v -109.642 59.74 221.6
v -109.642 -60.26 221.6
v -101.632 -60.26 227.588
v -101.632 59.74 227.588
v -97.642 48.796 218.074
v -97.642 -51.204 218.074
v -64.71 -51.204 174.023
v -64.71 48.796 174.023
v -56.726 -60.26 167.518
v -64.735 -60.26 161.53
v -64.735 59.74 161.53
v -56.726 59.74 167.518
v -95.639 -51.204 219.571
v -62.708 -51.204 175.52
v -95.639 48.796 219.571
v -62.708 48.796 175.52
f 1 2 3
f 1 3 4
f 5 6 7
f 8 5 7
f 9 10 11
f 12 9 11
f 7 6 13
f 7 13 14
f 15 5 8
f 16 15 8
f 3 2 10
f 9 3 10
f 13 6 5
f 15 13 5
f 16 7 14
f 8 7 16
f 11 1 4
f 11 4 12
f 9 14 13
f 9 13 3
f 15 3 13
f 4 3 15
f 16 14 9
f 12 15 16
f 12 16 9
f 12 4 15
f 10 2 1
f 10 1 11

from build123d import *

# Parameters (mm, degrees)
BOX002_W               = 55
BOX002_H               = 100
BOX002_DEPTH           = 10
SKETCH010_W            = 75
SKETCH010_H            = 120
PAD009_DEPTH           = 10
CUT037_ROLL_ANGLE      = 5e-06
CUT037_PITCH_ANGLE     = 53.219477
CUT037_PLACEMENT_ANGLE = 9e-06


with BuildPart() as box002:
    # Box002 → Box002 (new body)
    with BuildSketch(Plane(origin=(-115, 45.8, 7.5), x_dir=(1, 0, 0), z_dir=(0, 0, 1))):
        with Locations((27.5, 50)):
            Rectangle(BOX002_W, BOX002_H)
    extrude(amount=BOX002_DEPTH)


with BuildPart() as display:
    # Sketch010 → Pad009 (new body)
    with BuildSketch(Plane.XY):
        with Locations((-87.509099, 96.743134)):
            Rectangle(SKETCH010_W, SKETCH010_H)
    extrude(amount=PAD009_DEPTH)

    # Cut037: cut Box002
    add(box002.part, mode=Mode.SUBTRACT)


with BuildPart() as display_1:
    # Cut037 roll: moved
    add(display.part.rotate(Axis((0, 0, 0), (1, 0, 0)), CUT037_ROLL_ANGLE))


with BuildPart() as display_2:
    # Cut037 pitch: moved
    add(display_1.part.rotate(Axis((0, 0, 0), (0, 1, 0)), CUT037_PITCH_ANGLE))


with BuildPart() as display_3:
    # Cut037 placement: moved
    add(display_2.part.moved(Location((-34.792314, -97.00353, 121.476113))).rotate(Axis((-34.792314, -97.00353, 121.476113), (0, 0, 1)), CUT037_PLACEMENT_ANGLE))


solid = display_3.part
